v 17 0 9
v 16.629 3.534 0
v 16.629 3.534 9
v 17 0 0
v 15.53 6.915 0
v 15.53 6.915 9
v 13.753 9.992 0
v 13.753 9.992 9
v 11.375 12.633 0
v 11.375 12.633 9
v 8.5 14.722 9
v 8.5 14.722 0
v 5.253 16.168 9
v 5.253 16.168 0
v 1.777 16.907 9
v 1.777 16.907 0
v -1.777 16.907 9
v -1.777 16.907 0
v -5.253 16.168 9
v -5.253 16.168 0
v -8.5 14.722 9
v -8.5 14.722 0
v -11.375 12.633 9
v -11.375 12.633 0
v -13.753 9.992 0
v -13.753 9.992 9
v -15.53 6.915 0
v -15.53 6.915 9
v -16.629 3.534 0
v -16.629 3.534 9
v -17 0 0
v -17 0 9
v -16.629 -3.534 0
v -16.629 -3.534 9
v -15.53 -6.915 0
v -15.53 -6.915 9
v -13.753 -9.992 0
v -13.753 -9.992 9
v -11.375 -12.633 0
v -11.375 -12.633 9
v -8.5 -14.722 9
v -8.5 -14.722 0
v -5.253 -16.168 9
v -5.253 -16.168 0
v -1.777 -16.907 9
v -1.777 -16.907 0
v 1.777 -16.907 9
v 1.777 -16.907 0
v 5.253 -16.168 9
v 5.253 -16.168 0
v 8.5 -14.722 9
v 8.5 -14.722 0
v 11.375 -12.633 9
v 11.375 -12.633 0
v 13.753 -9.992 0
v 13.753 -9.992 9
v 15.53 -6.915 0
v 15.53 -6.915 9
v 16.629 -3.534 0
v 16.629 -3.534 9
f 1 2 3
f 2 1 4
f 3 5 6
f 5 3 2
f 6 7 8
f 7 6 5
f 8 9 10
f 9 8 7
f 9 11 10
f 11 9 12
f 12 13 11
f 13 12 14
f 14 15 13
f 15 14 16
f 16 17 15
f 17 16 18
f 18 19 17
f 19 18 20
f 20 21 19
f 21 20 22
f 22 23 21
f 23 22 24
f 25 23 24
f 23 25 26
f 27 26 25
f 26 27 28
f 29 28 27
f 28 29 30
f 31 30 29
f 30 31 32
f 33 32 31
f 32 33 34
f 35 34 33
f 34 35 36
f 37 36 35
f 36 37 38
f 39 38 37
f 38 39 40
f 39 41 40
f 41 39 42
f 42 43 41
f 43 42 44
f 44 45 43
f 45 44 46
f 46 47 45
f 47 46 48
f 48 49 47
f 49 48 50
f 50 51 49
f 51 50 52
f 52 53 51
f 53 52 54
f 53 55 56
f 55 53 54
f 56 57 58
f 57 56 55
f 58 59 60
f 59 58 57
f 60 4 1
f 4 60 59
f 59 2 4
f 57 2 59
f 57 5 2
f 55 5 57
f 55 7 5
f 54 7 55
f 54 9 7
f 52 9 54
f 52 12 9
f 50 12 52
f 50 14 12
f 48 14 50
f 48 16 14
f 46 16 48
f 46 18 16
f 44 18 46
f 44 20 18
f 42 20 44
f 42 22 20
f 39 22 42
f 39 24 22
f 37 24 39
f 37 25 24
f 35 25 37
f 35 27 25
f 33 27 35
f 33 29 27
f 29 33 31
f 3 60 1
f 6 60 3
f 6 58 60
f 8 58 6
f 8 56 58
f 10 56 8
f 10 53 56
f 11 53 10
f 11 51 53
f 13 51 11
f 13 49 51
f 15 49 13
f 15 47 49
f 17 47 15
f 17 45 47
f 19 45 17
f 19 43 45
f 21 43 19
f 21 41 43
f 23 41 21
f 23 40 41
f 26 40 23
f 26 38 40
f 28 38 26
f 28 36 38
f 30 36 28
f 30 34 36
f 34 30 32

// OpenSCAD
// Generated by SolidPython 1.0.1 on 2020-07-29 00:46:44


cylinder(h = 9, r1 = 17, r2 = 17);
/***********************************************
*********      SolidPython code:      **********
************************************************
 
# import packages: SolidPython
from solid import *
from solid.utils import *
from itertools import chain, combinations, permutations


class Resize:

    def __init__(self, scad_file):
        self.scad_file = scad_file
        #self.scad_file = import_scad(scad_file)
        # cone/cylinder param:
        self.r1 = 0
        self.r2 = 0
        self.h = 0
        # rectangular prism param:
        self.w = 0
        self.l = 0
        # ellipse param:
        self.r = 0

    # import OpenScad code (file name corresponds to shape)


    # classify shape + parameters
    def assign(self, param1, param2, param3):
        if self.scad_file == 'cone.scad':
            self.r1 = param1
            self.r2 = param2
            self.h = param3
        elif self.scad_file == 'cylinder.scad':
            self.r1 = param1
            self.r2 = param2
            self.h = param3
        elif self.scad_file == 'rectangularPrism.scad':
            self.h = param1
            self.l = param2
            self.w = param3
        else:
            self.r = param1
            self.h = param2

    # resize parameters
    def iterate(self):
        x = range(3, 20, 2)
        i = 1
        if self.scad_file == 'cone.scad':
            tempList = list(permutations(x, 2))
            for temp in tempList:
                param1 = temp[0]
                param2 = temp[1]
                filepath = 'produced_scad_files/' + 'cone' + str(param1) + '_' + str(param2) + '_' + '.scad'
                scad_render_to_file(cylinder(h=param1, r1=param2, r2=0), filepath)

        elif self.scad_file == 'cylinder.scad':
            tempList = list(permutations(x, 3))
            for temp in tempList:
                param1 = temp[0]
                param2 = temp[1]
                filepath = 'produced_scad_files/' + 'cylinder' + str(param1) + '_' + str(param2) + '_' + '.scad'
                scad_render_to_file(cylinder(h=param1, r1=param2, r2=param2), filepath)

        elif self.scad_file == 'rectangularPrism.scad':
            tempList = list(permutations(x, 3))
            for temp in tempList:
                param1 = temp[0]
                param2 = temp[1]
                param3 = temp[2]
                filepath = 'produced_scad_files/' + 'rectangularPrism' + str(param1) + '_' + str(param2) + '_' + str(
                    param3) + '.scad'
                scad_render_to_file(cube(size=(param1, param2, param3)), filepath)

        elif self.scad_file == 'ellipse.scad':
            tempList = list(permutations(x, 4))
            for temp in tempList:
                param1 = temp[0]
                param2 = temp[1]
                param3 = temp[2]
                param4 = temp[3]
                filepath = 'produced_scad_files/' + 'ellipse' + str(param1) + '_' + str(param2) + '_' + str(param3) + '_' + str(param4) + '.scad'
                scad_render_to_file(scale([param1, param2, param3])(sphere(r=param4)), filepath)

    def render_to_scadfile(self):
        scad_render_to_file(scad, 'example.scad') 
 
************************************************/
